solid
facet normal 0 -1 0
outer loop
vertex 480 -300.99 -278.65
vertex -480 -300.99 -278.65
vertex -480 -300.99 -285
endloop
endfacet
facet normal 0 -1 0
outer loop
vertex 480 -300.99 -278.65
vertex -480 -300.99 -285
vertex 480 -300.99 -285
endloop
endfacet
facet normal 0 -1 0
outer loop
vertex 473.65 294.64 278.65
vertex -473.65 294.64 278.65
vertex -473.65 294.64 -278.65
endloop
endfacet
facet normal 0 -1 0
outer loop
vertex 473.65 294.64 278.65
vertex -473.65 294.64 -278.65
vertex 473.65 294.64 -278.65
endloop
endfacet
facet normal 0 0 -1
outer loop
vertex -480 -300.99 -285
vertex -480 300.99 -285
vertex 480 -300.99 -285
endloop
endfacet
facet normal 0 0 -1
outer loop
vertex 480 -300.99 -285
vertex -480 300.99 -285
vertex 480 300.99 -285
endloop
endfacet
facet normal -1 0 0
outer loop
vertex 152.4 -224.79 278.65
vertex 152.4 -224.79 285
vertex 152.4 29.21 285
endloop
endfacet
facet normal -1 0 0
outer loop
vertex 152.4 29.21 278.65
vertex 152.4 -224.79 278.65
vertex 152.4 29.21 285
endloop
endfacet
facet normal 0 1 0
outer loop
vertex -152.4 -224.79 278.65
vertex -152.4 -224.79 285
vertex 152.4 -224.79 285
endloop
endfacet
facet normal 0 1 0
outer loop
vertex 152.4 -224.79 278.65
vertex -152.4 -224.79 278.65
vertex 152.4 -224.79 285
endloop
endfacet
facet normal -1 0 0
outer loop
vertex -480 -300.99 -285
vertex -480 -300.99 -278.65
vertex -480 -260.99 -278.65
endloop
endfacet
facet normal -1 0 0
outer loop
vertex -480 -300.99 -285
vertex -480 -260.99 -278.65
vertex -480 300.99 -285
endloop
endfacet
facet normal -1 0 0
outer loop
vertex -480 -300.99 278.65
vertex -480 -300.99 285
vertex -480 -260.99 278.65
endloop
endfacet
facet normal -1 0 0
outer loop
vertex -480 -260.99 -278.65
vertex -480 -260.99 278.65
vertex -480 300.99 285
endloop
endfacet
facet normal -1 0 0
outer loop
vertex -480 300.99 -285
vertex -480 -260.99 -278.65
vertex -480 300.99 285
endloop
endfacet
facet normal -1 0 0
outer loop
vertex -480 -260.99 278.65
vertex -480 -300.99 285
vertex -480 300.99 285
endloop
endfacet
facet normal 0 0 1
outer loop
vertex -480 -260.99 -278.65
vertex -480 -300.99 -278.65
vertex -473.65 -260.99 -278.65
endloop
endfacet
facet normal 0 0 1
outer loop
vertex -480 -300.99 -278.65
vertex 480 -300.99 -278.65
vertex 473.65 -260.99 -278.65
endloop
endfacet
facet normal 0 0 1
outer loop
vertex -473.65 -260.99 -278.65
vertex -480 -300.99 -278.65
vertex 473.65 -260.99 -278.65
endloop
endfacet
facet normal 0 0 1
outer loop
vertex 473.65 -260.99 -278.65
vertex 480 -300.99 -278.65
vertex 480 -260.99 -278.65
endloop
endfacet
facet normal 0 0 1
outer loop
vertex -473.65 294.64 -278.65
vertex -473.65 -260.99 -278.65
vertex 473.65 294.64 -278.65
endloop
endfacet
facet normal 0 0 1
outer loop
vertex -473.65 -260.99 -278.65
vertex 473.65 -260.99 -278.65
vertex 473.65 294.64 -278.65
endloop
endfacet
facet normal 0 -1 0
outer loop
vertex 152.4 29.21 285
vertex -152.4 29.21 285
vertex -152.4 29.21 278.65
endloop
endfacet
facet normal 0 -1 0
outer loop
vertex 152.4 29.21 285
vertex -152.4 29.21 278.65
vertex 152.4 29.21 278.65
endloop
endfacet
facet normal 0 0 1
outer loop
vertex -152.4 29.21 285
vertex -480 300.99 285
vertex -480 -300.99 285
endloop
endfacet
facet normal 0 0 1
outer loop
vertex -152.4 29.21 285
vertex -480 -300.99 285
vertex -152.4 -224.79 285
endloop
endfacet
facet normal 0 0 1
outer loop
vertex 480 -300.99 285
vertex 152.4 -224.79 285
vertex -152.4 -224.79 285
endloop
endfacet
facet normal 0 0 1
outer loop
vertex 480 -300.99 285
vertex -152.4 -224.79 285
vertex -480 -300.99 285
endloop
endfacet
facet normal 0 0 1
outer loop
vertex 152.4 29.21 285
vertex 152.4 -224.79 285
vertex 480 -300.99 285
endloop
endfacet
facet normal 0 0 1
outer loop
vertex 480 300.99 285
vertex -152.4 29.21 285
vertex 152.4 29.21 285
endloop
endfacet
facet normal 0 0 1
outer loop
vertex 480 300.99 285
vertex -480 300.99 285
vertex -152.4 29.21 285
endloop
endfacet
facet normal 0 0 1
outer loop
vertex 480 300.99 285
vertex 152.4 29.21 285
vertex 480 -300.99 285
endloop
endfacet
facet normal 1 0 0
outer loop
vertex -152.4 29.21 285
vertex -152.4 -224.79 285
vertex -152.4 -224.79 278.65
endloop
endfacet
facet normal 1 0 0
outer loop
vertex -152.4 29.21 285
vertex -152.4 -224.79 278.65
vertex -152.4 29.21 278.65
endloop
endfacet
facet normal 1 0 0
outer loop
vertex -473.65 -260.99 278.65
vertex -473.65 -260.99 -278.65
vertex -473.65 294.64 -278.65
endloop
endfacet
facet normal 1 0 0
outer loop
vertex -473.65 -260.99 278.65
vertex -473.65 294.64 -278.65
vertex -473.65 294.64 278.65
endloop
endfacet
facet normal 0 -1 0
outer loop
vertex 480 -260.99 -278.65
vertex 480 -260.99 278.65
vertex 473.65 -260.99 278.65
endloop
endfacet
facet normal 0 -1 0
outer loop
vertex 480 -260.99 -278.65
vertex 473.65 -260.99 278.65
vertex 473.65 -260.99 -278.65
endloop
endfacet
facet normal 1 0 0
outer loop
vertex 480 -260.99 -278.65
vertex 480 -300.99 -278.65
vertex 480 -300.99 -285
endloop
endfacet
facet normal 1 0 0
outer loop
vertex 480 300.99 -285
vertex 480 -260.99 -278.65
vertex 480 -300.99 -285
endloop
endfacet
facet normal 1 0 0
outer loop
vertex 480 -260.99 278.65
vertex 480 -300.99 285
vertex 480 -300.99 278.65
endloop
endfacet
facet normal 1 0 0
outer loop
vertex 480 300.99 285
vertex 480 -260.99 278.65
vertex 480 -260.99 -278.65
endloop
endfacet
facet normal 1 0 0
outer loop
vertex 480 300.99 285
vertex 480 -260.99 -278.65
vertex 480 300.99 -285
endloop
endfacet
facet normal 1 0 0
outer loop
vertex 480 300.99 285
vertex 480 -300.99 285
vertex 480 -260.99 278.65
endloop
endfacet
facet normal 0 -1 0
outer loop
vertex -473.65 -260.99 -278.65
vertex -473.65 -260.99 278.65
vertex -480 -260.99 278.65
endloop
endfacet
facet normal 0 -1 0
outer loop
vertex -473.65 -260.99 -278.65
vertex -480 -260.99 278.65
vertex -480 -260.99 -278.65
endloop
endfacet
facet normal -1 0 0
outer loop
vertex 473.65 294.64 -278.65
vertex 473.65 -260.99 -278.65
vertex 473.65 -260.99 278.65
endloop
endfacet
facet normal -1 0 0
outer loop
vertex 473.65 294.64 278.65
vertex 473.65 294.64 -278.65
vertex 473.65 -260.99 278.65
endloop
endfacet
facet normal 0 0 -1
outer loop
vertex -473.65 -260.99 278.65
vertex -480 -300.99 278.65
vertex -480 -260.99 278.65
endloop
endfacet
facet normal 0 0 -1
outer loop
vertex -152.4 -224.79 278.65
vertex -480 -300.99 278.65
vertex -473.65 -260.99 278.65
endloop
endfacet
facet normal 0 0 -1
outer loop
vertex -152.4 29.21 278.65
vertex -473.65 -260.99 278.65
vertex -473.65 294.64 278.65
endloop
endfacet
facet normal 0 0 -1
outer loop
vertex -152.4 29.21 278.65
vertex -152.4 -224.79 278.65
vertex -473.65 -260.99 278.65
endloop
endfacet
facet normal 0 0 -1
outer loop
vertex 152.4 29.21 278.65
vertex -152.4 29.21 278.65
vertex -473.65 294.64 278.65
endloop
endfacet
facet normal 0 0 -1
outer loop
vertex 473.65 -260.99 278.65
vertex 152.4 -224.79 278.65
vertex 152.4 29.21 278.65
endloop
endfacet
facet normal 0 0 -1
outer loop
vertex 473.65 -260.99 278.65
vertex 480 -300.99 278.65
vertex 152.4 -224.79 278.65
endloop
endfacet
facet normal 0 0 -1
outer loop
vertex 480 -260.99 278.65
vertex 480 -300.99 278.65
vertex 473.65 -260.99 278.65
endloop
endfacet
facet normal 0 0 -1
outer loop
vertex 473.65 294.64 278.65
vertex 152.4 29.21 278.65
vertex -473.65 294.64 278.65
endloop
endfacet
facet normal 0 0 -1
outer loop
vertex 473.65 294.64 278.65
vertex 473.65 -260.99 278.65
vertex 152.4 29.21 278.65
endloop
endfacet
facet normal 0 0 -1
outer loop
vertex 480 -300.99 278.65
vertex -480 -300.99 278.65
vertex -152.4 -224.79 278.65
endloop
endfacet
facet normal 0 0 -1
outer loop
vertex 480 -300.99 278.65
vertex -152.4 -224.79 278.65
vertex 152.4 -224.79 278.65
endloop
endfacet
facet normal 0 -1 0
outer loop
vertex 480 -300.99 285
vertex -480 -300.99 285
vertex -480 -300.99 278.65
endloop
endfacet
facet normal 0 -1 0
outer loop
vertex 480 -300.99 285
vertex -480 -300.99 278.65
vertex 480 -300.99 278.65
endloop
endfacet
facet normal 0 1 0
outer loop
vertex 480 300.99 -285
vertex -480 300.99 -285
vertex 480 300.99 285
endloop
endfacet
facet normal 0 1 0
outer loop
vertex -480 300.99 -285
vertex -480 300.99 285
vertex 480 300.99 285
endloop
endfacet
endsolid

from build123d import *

# Parameters (mm, degrees)
ESQUISSE1_W             = 960
ESQUISSE1_H             = 601.98
BOSS_EXTRU_1_DEPTH      = 285
ESQUISSE4_W             = 947.3
ESQUISSE4_H             = 557.3
ENL_V_MAT_EXTRU_7_DEPTH = 595.63
ESQUISSE5_W             = 557.3
ESQUISSE5_H             = 40
ENL_V_MAT_EXTRU_8_DEPTH = 1046.667241574
ESQUISSE6_W             = 304.8
ESQUISSE6_H             = 254
ENL_V_MAT_EXTRU_9_DEPTH = 25.4


with BuildPart() as part:
    # Esquisse1 → Boss.-Extru.1 (new, symmetric)
    with BuildSketch(Plane.XY):
        Rectangle(ESQUISSE1_W, ESQUISSE1_H)
    extrude(amount=BOSS_EXTRU_1_DEPTH, both=True)

    # Esquisse4 → Enlèv. mat.-Extru.7 (cut)
    with BuildSketch(Plane.XZ.offset(300.99)):
        Rectangle(ESQUISSE4_W, ESQUISSE4_H)
    extrude(amount=-ENL_V_MAT_EXTRU_7_DEPTH, mode=Mode.SUBTRACT)

    # Esquisse5 → Enlèv. mat.-Extru.8 (cut, through all)
    with BuildSketch(Plane(origin=(480, 0, 0), x_dir=(0, 0, -1), z_dir=(1, 0, 0))):
        with Locations((0, -280.99)):
            Rectangle(ESQUISSE5_W, ESQUISSE5_H)
    extrude(amount=-ENL_V_MAT_EXTRU_8_DEPTH, mode=Mode.SUBTRACT)

    # Esquisse6 → Enlèv. mat.-Extru.9 (cut)
    with BuildSketch(Plane.XY.offset(285)):
        with Locations((0, -97.79)):
            Rectangle(ESQUISSE6_W, ESQUISSE6_H)
    extrude(amount=-ENL_V_MAT_EXTRU_9_DEPTH, mode=Mode.SUBTRACT)


solid = part.part
